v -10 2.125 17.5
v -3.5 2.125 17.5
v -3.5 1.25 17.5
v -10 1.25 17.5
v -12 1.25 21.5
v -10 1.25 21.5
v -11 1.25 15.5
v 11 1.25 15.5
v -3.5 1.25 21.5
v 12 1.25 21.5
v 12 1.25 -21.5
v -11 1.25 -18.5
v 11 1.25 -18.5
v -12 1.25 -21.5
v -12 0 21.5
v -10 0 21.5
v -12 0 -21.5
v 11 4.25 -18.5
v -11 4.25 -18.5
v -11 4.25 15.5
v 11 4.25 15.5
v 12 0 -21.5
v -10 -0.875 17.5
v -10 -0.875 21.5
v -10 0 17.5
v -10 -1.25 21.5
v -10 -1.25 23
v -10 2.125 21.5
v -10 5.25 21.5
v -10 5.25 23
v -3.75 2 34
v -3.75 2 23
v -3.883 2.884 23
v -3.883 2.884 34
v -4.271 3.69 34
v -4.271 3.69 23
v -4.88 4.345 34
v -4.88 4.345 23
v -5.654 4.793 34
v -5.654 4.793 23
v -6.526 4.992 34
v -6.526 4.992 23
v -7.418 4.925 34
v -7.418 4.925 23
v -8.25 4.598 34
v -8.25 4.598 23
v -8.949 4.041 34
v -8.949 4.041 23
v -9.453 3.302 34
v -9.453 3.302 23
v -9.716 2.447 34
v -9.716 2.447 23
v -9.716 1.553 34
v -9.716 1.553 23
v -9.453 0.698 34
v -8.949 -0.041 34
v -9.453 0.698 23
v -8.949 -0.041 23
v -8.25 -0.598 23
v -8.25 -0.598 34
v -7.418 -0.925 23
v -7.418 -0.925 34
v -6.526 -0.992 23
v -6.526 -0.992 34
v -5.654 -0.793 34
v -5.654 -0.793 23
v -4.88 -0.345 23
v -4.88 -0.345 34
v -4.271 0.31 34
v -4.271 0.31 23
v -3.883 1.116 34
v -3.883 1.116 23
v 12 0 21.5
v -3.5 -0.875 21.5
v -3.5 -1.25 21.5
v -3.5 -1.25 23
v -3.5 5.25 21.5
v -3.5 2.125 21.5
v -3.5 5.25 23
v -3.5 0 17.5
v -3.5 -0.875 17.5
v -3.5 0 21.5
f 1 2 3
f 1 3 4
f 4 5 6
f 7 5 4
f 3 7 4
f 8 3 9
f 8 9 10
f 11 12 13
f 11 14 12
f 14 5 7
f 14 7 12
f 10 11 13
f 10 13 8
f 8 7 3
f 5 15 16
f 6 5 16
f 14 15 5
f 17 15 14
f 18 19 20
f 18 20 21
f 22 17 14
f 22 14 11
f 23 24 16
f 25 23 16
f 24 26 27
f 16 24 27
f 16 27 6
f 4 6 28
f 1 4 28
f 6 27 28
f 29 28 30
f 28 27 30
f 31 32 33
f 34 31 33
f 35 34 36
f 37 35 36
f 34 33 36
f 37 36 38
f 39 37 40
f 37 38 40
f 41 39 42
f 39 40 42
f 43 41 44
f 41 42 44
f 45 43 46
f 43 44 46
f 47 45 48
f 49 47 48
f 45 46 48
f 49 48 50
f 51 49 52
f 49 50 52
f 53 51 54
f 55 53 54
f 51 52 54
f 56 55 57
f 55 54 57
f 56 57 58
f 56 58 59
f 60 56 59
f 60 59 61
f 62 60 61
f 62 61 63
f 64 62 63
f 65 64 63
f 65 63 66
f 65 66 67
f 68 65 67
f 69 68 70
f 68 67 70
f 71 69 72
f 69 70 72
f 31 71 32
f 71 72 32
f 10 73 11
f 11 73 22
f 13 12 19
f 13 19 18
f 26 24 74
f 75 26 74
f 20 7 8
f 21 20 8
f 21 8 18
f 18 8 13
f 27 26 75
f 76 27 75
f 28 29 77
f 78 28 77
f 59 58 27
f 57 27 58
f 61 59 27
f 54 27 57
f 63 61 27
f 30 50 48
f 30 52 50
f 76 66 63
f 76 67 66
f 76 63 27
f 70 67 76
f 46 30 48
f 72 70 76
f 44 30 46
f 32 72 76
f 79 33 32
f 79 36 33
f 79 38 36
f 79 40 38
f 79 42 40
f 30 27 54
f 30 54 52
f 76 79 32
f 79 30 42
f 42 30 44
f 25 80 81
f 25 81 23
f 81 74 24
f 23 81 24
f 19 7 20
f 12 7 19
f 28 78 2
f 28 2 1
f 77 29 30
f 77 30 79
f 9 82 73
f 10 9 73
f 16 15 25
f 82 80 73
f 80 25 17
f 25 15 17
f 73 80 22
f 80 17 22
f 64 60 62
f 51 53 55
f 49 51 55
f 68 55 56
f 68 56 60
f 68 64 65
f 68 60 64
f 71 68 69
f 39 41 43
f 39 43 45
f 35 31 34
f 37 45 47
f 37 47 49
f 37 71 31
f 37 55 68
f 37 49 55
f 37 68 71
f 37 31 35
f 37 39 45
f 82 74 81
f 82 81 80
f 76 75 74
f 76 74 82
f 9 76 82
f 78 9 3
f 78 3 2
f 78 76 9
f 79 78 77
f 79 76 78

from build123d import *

# Parameters (mm, degrees)
SKETCH1_W                  = 24
SKETCH1_H                  = 43
PCB_DEPTH                  = 1.25
SKETCH2_W                  = 22
SKETCH2_H                  = 34
RF_CASING_DEPTH            = 3
SKETCH3_W                  = 6.5
SKETCH3_H                  = 6.5
RF_CONNECTOR_BACK_DEPTH    = 1.5
SKETCH4_R                  = 3
RF_CONNECTOR_THREADS_DEPTH = 11
SKETCH5_W                  = 6.5
SKETCH5_H                  = 3
RF_CONNECTOR_PINS_DEPTH    = 4


with BuildPart() as part:
    # Sketch1 → PCB (new body)
    with BuildSketch(Plane(origin=(0, 0, 0), x_dir=(1, 0, 0), z_dir=(0, 1, 0))):
        Rectangle(SKETCH1_W, SKETCH1_H)
    extrude(amount=PCB_DEPTH)

    # Sketch2 → RF Casing (add)
    with BuildSketch(Plane(origin=(0, 1.25, 0), x_dir=(1, 0, 0), z_dir=(0, 1, 0))):
        with Locations((0, 1.5)):
            Rectangle(SKETCH2_W, SKETCH2_H)
    extrude(amount=RF_CASING_DEPTH)

    # Sketch3 → RF Connector Back (add)
    with BuildSketch(Plane.XY.offset(21.5)):
        with Locations((-6.75, 2)):
            Rectangle(SKETCH3_W, SKETCH3_H)
    extrude(amount=RF_CONNECTOR_BACK_DEPTH)

    # Sketch4 → RF Connector Threads (add)
    with BuildSketch(Plane.XY.offset(23)):
        with Locations((-6.75, 2)):
            Circle(SKETCH4_R)
    extrude(amount=RF_CONNECTOR_THREADS_DEPTH)

    # Sketch5 → RF Connector Pins (add)
    with BuildSketch(Plane(origin=(0, 0, 21.5), x_dir=(-1, 0, 0), z_dir=(0, 0, -1))):
        with Locations((6.75, 0.625)):
            Rectangle(SKETCH5_W, SKETCH5_H)
    extrude(amount=RF_CONNECTOR_PINS_DEPTH)


solid = part.part
